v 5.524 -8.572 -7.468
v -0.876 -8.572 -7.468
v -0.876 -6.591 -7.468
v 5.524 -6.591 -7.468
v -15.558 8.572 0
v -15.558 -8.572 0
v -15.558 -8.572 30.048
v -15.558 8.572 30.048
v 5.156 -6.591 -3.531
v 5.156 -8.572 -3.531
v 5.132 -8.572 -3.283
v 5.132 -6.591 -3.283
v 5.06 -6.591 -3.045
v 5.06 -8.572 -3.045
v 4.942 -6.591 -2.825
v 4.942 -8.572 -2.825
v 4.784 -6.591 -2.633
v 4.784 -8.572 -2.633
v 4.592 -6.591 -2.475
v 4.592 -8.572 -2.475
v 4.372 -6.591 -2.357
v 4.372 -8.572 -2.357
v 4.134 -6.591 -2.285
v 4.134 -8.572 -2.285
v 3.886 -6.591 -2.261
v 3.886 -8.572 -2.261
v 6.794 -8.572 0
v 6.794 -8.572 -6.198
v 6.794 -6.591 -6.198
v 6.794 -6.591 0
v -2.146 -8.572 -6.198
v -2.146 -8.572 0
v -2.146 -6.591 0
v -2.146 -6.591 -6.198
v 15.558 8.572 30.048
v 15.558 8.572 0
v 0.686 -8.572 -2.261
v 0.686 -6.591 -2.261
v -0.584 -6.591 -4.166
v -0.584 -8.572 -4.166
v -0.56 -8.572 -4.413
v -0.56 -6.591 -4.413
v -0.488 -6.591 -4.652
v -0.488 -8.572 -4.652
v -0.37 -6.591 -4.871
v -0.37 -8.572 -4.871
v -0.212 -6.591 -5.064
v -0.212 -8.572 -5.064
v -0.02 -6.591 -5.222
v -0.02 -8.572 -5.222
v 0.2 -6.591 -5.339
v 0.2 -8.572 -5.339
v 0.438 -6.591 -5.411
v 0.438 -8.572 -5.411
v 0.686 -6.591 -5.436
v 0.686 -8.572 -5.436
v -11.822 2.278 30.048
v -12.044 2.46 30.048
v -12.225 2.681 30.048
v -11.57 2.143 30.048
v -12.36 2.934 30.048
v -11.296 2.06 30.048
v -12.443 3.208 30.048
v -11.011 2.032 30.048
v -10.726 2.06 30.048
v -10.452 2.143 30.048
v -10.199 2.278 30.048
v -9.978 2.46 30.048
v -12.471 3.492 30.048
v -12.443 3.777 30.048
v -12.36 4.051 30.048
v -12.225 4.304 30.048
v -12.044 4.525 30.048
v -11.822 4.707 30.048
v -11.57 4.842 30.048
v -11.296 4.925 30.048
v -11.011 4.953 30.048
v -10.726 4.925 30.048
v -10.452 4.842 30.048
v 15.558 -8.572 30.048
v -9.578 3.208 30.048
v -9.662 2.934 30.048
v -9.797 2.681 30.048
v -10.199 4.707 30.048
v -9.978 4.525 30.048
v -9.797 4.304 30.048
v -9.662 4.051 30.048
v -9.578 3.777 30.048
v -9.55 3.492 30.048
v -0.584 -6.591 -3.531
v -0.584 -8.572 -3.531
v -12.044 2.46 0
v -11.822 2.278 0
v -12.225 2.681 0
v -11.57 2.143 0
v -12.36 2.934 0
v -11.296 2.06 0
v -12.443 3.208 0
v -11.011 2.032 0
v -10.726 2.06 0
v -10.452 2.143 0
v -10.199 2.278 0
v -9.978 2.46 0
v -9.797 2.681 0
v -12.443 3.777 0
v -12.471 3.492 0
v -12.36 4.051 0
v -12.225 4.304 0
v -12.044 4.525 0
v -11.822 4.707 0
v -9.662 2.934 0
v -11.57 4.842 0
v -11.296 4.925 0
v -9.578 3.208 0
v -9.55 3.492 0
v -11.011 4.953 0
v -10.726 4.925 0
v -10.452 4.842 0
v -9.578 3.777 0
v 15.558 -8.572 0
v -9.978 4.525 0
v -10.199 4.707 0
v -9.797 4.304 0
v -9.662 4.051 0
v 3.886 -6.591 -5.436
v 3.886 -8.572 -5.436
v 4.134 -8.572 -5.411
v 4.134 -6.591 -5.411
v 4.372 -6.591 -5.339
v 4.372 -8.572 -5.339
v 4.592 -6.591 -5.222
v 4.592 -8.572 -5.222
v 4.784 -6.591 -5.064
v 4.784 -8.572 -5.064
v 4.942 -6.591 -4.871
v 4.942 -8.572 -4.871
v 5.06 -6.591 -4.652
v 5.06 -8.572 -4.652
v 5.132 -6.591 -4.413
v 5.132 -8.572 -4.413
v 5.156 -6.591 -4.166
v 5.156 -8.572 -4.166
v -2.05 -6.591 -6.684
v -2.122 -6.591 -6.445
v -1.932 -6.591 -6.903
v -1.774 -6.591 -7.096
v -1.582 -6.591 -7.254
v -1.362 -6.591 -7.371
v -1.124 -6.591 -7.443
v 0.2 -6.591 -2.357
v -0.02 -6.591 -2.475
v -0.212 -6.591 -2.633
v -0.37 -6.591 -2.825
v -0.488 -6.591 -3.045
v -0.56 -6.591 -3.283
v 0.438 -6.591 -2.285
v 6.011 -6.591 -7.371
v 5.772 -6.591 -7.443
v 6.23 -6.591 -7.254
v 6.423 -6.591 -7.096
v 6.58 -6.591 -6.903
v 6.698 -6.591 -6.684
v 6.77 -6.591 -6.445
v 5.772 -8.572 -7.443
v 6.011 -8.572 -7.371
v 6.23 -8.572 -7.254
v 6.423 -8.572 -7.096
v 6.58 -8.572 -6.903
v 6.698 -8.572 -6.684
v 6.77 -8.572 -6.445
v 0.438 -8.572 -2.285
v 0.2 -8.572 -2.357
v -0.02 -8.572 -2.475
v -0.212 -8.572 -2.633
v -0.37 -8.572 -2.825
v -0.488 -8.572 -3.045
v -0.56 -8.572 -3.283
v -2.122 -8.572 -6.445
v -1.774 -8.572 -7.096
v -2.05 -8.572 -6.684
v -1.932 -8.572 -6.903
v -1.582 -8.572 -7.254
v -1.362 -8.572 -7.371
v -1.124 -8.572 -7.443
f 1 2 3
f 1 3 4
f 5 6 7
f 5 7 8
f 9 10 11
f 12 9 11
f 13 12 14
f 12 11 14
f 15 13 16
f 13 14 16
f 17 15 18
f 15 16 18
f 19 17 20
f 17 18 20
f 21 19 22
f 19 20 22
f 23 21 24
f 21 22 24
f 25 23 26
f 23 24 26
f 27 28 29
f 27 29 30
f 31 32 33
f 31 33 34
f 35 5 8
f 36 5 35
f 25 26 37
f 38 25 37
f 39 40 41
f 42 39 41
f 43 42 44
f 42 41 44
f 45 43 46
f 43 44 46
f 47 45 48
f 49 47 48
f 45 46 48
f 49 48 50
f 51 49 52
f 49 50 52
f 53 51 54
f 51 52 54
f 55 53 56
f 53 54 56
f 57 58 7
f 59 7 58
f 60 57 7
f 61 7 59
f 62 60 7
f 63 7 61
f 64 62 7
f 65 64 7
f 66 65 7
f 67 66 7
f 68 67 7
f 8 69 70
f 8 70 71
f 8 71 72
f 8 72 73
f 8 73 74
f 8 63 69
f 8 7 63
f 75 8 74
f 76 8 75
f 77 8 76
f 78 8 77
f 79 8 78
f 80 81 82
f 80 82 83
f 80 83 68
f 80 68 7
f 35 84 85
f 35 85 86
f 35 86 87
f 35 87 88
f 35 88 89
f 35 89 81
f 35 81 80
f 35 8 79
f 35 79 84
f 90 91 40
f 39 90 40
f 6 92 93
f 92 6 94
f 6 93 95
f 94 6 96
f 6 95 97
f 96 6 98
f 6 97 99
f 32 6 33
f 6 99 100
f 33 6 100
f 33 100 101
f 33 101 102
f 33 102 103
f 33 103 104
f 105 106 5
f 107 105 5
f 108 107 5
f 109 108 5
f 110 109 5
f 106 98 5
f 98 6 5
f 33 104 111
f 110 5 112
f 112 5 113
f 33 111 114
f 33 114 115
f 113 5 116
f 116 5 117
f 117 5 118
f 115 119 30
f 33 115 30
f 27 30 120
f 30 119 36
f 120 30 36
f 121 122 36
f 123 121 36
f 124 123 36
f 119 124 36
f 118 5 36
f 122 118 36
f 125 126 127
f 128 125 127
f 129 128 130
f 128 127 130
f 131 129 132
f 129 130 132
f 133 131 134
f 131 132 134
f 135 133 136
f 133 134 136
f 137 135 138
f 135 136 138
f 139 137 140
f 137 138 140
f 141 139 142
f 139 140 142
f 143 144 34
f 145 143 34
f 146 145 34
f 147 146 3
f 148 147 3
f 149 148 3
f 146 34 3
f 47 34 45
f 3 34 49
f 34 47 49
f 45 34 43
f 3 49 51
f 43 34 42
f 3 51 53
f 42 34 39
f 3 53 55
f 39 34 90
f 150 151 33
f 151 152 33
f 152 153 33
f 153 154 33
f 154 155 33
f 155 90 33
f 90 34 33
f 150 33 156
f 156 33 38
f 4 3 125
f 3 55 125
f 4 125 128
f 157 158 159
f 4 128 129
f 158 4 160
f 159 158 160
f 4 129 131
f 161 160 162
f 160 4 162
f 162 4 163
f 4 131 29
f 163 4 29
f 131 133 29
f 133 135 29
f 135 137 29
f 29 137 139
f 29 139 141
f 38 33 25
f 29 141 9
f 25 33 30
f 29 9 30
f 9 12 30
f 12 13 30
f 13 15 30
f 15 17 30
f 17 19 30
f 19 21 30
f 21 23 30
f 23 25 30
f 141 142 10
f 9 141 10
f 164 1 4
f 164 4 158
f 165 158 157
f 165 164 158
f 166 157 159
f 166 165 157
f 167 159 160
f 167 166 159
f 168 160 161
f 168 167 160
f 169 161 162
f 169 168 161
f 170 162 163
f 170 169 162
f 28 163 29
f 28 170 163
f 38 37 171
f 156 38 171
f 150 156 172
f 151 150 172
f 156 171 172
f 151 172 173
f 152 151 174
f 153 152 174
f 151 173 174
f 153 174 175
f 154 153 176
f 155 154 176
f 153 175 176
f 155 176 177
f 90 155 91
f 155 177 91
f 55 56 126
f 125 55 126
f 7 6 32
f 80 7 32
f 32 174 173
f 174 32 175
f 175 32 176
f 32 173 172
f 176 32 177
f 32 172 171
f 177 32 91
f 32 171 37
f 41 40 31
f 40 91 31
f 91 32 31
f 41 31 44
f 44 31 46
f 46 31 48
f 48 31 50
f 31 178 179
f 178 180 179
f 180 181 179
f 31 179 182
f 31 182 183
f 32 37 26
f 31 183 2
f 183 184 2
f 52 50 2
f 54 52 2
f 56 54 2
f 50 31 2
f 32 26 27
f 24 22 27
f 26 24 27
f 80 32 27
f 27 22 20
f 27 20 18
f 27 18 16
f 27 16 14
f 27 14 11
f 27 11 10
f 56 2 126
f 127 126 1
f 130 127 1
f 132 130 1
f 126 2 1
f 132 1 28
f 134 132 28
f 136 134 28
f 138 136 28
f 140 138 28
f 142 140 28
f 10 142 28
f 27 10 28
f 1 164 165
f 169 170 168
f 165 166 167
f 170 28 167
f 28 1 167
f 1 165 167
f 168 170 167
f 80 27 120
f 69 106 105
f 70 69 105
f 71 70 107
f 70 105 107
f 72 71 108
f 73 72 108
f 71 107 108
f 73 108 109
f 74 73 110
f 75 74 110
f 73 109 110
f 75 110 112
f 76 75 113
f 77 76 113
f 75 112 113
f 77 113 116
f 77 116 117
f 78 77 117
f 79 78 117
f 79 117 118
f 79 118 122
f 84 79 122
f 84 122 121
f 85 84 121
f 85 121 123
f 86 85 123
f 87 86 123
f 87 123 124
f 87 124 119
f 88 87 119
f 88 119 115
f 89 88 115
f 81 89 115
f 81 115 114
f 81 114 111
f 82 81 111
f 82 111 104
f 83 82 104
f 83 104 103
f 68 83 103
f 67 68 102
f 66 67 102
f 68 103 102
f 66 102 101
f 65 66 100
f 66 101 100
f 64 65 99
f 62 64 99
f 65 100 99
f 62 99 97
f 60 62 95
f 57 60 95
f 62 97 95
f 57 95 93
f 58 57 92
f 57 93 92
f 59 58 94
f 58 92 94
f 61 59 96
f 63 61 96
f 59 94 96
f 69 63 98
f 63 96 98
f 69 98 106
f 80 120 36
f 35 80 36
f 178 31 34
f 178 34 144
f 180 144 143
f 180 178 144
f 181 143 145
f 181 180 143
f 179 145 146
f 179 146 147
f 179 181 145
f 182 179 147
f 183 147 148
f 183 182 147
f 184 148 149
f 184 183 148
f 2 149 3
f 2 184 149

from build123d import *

# Parameters (mm, degrees)
SKETCH1_W            = 31.115
SKETCH1_H            = 17.145
MOTOR_BODY_DEPTH     = 30.0482
FASTENING_HOLE_DEPTH = 1.9812
SKETCH3_R            = 1.4605
SHAFT_HOLE_DEPTH     = 31.0482


with BuildPart() as part:
    # Sketch1 → Motor Body (new body)
    with BuildSketch(Plane.XY):
        Rectangle(SKETCH1_W, SKETCH1_H)
    extrude(amount=MOTOR_BODY_DEPTH)

    # Sketch2 → Fastening hole (add)
    with BuildSketch(Plane.XZ.offset(8.5725)):
        with BuildLine():
            Line((-0.8763, -7.4676), (5.5245, -7.4676))
            ThreePointArc((5.5245, -7.4676), (6.422525612, -7.095625612), (6.7945, -6.1976))
            Line((6.7945, -6.1976), (6.7945, 0))
            Line((6.7945, 0), (-2.1463, 0))
            Line((-2.1463, 0), (-2.1463, -6.1976))
            ThreePointArc((-2.1463, -6.1976), (-1.774325612, -7.095625612), (-0.8763, -7.4676))
        make_face()
        with BuildLine():
            Line((0.6858, -5.4356), (3.8862, -5.4356))
            ThreePointArc((3.8862, -5.4356), (4.784225612, -5.063625612), (5.1562, -4.1656))
            Line((5.1562, -4.1656), (5.1562, -3.5306))
            ThreePointArc((5.1562, -3.5306), (4.784225612, -2.632574388), (3.8862, -2.2606))
            Line((3.8862, -2.2606), (0.6858, -2.2606))
            ThreePointArc((0.6858, -2.2606), (-0.212225612, -2.632574388), (-0.5842, -3.5306))
            Line((-0.5842, -3.5306), (-0.5842, -4.1656))
            ThreePointArc((-0.5842, -4.1656), (-0.212225612, -5.063625612), (0.6858, -5.4356))
        make_face(mode=Mode.SUBTRACT)
    extrude(amount=-FASTENING_HOLE_DEPTH)

    # Sketch3 → Shaft hole (cut, through all)
    with BuildSketch(Plane(origin=(0, 0, 0), x_dir=(-1, 0, 0), z_dir=(0, 0, -1))):
        with Locations((11.0109, 3.4925)):
            Circle(SKETCH3_R)
    extrude(amount=-SHAFT_HOLE_DEPTH, mode=Mode.SUBTRACT)


solid = part.part
